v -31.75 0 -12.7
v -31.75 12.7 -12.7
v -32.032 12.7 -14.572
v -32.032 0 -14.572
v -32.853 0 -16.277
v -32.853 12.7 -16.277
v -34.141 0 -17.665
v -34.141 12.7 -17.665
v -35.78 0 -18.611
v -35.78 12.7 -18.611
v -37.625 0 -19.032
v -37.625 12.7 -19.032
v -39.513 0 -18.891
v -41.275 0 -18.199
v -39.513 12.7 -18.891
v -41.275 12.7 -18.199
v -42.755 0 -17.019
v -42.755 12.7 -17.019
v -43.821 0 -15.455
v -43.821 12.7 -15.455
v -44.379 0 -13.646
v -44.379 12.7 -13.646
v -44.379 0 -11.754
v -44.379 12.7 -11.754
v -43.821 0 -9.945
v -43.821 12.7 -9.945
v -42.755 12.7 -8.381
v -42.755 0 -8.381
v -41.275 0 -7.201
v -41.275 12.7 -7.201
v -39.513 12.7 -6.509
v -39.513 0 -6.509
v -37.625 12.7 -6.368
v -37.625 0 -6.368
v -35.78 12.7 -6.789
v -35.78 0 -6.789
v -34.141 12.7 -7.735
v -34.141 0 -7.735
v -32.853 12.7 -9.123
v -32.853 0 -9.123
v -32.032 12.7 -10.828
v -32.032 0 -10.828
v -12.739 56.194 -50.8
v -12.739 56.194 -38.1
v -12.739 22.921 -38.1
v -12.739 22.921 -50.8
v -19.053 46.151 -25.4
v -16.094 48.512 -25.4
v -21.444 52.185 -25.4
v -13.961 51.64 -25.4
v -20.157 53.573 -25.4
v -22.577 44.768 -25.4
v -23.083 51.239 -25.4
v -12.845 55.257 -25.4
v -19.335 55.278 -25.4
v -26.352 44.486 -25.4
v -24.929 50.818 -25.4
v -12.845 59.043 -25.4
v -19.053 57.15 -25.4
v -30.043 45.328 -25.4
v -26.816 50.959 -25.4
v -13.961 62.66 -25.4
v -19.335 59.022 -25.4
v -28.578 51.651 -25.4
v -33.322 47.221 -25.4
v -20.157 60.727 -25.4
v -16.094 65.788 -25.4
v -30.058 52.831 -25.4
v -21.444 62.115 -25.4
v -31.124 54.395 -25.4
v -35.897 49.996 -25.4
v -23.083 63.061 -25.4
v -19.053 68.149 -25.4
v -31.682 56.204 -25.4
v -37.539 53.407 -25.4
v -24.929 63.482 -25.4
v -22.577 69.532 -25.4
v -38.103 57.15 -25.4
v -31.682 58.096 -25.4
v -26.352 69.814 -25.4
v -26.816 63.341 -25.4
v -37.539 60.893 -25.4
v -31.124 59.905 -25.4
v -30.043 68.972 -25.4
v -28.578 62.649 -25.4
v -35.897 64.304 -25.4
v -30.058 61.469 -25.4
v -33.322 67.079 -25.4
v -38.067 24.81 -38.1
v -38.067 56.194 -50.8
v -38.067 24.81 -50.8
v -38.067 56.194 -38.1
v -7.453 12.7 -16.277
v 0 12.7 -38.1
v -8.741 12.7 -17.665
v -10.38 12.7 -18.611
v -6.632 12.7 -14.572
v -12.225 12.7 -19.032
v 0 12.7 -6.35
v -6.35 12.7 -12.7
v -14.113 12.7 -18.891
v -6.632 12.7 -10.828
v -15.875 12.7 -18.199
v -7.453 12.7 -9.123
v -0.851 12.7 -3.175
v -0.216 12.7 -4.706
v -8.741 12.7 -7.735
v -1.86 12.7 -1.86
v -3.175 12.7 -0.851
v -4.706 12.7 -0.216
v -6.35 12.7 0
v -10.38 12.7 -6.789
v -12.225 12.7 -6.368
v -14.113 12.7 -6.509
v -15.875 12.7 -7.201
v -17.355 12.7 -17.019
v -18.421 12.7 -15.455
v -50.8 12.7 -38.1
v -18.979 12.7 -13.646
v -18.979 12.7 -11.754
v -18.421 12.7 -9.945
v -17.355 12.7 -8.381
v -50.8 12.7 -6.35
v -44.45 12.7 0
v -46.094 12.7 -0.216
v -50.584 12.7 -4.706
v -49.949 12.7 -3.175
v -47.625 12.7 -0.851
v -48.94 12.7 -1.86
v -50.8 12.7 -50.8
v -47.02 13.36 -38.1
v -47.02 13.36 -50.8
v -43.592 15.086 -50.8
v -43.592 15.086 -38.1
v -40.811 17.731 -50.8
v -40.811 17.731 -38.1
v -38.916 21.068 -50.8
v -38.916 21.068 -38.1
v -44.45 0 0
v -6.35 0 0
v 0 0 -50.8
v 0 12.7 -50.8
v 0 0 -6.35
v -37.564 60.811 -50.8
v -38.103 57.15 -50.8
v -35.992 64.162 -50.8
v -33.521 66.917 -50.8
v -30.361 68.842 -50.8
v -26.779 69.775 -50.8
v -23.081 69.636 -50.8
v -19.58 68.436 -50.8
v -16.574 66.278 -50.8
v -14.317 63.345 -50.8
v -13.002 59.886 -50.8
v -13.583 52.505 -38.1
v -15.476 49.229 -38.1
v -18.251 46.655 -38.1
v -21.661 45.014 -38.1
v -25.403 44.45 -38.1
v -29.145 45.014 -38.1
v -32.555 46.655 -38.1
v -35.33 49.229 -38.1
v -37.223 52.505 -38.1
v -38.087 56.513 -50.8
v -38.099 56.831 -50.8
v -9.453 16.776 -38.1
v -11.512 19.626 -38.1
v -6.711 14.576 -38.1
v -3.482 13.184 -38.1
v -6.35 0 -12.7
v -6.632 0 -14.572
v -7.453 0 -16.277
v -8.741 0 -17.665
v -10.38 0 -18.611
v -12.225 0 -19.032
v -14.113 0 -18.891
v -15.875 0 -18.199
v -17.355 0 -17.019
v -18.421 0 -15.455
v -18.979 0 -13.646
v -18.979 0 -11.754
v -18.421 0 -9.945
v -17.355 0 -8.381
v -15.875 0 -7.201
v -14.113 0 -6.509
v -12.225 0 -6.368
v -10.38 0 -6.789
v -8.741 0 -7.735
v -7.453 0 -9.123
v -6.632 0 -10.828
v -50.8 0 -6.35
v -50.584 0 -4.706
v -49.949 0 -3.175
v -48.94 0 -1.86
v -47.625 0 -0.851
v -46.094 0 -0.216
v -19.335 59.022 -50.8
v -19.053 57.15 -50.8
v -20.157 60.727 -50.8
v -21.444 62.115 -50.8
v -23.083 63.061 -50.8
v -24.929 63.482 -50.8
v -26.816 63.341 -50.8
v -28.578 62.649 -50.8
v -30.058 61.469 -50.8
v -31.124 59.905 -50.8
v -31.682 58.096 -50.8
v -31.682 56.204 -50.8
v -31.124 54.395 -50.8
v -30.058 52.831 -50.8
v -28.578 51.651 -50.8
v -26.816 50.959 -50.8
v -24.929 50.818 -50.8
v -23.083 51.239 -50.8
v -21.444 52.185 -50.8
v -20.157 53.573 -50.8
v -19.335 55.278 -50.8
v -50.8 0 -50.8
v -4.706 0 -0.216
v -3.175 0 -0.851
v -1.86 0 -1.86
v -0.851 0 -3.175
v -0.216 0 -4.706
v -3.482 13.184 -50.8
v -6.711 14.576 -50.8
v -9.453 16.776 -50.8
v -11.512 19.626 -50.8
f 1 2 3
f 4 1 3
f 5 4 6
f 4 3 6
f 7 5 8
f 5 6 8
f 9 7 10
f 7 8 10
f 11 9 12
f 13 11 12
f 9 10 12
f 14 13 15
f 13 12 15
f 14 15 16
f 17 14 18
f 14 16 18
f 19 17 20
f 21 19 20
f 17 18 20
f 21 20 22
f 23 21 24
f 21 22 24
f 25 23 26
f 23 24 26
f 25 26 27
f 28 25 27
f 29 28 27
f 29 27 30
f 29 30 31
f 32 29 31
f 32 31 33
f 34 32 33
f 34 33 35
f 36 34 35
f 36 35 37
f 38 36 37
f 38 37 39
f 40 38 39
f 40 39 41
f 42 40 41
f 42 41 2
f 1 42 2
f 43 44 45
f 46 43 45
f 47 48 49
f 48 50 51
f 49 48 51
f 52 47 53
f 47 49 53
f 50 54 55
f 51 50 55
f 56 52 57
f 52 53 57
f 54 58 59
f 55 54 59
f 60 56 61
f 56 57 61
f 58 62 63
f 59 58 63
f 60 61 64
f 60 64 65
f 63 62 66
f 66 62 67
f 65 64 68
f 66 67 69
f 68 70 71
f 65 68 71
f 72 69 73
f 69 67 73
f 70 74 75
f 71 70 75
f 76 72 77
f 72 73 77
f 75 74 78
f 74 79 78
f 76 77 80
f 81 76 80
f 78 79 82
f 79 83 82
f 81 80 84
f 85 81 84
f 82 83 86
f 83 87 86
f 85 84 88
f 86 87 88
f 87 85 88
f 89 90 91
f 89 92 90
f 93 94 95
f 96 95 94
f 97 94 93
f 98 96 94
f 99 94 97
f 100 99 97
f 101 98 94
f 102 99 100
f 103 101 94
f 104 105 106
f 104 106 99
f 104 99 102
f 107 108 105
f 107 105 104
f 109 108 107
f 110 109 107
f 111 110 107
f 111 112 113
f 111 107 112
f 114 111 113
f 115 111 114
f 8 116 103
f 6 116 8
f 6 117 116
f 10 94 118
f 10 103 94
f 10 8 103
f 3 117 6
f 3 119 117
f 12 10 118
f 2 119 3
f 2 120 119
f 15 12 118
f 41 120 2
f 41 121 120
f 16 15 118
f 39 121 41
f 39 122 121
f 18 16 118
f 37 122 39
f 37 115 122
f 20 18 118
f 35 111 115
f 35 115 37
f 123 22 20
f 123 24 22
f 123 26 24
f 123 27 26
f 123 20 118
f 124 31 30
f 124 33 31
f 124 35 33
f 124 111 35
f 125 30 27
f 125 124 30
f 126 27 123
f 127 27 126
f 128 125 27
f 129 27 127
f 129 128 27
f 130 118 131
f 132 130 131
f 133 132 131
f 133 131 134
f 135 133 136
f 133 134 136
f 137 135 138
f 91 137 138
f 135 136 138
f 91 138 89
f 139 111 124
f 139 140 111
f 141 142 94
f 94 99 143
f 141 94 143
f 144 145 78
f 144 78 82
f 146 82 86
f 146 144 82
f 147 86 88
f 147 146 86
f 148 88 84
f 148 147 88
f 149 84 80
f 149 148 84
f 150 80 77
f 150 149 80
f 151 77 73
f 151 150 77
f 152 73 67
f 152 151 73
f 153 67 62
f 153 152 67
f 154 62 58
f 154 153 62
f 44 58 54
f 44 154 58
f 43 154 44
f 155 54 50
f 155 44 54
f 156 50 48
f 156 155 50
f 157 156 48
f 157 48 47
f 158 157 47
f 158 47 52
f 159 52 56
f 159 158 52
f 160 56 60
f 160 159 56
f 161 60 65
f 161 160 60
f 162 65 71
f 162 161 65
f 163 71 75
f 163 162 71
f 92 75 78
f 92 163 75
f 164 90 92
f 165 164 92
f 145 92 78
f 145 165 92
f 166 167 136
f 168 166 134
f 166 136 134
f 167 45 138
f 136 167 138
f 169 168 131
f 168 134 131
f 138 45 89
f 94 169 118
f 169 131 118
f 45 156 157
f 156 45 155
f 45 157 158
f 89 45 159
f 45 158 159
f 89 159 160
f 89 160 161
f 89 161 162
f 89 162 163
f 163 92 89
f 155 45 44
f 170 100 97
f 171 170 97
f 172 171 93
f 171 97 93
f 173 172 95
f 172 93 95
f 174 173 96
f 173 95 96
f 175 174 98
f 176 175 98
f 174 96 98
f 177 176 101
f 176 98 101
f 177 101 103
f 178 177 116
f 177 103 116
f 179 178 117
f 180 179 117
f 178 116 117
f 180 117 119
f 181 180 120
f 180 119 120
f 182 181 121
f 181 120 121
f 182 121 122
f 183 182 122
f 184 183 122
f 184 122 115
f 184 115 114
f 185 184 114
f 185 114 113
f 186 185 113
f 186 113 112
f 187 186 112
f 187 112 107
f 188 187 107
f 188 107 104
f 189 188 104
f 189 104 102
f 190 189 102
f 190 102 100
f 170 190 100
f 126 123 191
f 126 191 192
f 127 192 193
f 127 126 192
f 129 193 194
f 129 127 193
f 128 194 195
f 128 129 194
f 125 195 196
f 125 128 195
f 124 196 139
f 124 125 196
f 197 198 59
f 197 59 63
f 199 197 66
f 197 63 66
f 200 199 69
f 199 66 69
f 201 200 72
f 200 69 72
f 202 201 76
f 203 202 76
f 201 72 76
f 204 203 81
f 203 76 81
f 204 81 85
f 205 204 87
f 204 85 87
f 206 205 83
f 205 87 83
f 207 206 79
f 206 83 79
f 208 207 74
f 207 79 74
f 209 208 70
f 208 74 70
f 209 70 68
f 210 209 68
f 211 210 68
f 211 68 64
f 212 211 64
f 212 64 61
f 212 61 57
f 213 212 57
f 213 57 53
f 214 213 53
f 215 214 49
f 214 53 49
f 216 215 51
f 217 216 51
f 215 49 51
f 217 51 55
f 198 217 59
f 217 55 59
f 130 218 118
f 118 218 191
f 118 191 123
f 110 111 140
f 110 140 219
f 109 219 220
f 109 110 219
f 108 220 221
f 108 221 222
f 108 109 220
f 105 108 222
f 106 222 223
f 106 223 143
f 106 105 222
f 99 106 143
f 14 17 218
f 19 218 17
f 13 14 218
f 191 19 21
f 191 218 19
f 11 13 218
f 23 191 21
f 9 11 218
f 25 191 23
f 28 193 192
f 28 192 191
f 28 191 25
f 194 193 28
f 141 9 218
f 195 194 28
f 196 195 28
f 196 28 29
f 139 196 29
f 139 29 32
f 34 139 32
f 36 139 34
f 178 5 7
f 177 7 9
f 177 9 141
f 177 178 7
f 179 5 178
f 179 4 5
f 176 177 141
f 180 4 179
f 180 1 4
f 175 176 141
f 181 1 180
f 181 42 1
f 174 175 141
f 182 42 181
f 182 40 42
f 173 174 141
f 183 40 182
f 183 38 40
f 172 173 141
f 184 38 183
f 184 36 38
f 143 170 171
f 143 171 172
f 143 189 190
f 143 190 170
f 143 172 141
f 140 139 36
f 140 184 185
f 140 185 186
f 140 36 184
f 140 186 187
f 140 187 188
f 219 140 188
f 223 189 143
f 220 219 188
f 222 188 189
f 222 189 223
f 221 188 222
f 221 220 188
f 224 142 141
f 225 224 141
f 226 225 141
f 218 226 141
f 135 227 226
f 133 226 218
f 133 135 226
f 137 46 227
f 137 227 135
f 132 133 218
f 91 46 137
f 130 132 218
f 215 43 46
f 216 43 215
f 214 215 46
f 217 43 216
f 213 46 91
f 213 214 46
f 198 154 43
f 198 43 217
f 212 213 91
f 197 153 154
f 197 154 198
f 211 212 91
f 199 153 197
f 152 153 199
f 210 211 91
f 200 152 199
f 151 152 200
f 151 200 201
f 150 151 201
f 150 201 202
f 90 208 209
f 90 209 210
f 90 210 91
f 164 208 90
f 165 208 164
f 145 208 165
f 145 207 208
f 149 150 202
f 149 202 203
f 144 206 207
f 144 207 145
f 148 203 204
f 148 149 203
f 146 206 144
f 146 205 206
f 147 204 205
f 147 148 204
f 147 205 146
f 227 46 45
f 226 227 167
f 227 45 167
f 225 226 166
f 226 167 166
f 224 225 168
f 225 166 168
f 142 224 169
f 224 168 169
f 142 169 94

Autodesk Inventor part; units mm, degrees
ref_plane "YZ Plane" through (0, 0, 0) normal (1, 0, 0) x (0, 1, 0)
ref_plane "XZ Plane" through (0, 0, 0) normal (0, 1, 0) x (-1, 0, 0)
ref_plane "XY Plane" through (0, 0, 0) normal (0, 0, 1) x (1, 0, 0)
sketch "Sketch1" plane through (0, 0, 0) normal (0, 1, 0) x (-1, 0, 0)
  line L0 (0, 0) -> (50.8, 0)
  line L1 (50.8, 0) -> (50.8, -38.1)
  line L2 (50.8, -38.1) -> (0, -38.1)
  line L3 (0, -38.1) -> (0, 0)
  dimension "d0" = 50.8
  dimension "d1" = 38.1
extrude "Extrusion1" add sketch "Sketch1" along normal blind 12.7
fillet "Fillet1" radius 6.35 2 edges at (0, 6.35, 0) (-50.8, 6.35, 0)
sketch "Sketch2" plane through (0, 12.7, 0) normal (0, 1, 0) x (1, 0, 0)
  circle A0 centre (-12.7, 12.7) radius 6.35
  circle A1 centre (-38.1, 12.7) radius 6.35
  line L0 (-50.8, 38.1) -> (-50.8, 6.35) projected
  line L1 (-44.45, 0) -> (-6.35, 0) projected
  point P0 (0, 0)
  dimension "d5" = 12.7
  dimension "d6" = 12.7
  dimension "d7" = 12.7
  dimension "d8" = 12.7
extrude "Extrusion2" cut sketch "Sketch2" against normal blind 12.7
sketch "Sketch3" plane through (0, 0, -38.1) normal (0, 0, -1) x (-1, 0, 0)
  line L0 (6.35, 0) -> (0, 0) projected
  line L1 (0, 0) -> (50.8, 0)
  line L2 (50.8, 0) -> (50.8, 57.15)
  line L3 (50.8, 57.15) -> (0, 57.15)
  line L4 (0, 57.15) -> (0, 0)
  dimension "d11" = 57.15
extrude "Extrusion3" add sketch "Sketch3" along normal blind 12.7
sketch "Sketch4" plane through (0, 0, -38.1) normal (0, 0, 1) x (1, 0, 0)
  line L0 (0, 57.15) -> (0, 12.7) projected
  line L1 (0, 57.15) -> (-12.7, 57.15)
  line L2 (-12.7, 57.15) -> (-12.7, 12.7)
  line L3 (-12.7, 12.7) -> (0, 12.7)
  line L4 (0, 12.7) -> (0, 57.15)
  line L5 (-50.8, 12.7) -> (-44.45, 12.7) projected
  line L6 (-50.8, 57.15) -> (0, 57.15) projected
  line L7 (-50.8, 12.7) -> (-38.1, 12.7)
  line L8 (-38.1, 12.7) -> (-38.1, 57.15)
  line L9 (-38.1, 57.15) -> (-50.8, 57.15)
  line L10 (-50.8, 57.15) -> (-50.8, 12.7)
  point P0 (0, 0)
  dimension "d14" = 12.7
  dimension "d15" = 12.7
sketch "Sketch5" plane through (0, 0, -38.1) normal (0, 0, 1) x (1, 0, 0)
  line L0 (-50.8, 57.15) -> (0, 57.15) projected
  line L1 (-38.0673, 57.15) -> (-38.0673, 24.8104)
  line L2 (0, 12.7) -> (-50.8, 12.7) projected
  arc A0 (-50.8, 12.7) -> (-38.0673, 24.8104) centre (-51.1401, 25.8062) ccw
  line L3 (-12.7393, 57.15) -> (-12.7393, 22.9207)
  arc A1 (-12.7393, 22.9207) -> (0, 12.7) centre (0.0454, 25.8063) ccw
  line L4 (-38.0673, 57.15) -> (-50.8, 57.15)
  line L5 (-50.8, 12.7) -> (-50.8, 57.15) projected
  line L6 (-50.8, 12.7) -> (-50.8, 57.15)
  line L7 (-12.7393, 57.15) -> (0, 57.15)
  line L8 (0, 57.15) -> (0, 12.7) projected
  line L9 (0, 57.15) -> (0, 12.7)
  point P0 (0, 0)
  dimension "d16" = 13.1064
extrude "Extrusion4" cut sketch "Sketch5" against normal blind 33.3375 contours L0 L1 A0 L5 | L0 L8 A1 L3
sketch "Sketch6" plane through (0, 0, -50.8) normal (0, 0, -1) x (-1, 0, 0)
  line L0 (38.0673, 57.15) -> (12.7393, 57.15) projected
  circle A0 centre (25.4033, 57.15) radius 12.7
  point P0 (0, 0)
  dimension "d19" = 25.4
extrude "Extrusion5" add sketch "Sketch6" against normal blind 25.4
sketch "Sketch7" plane through (-25.4033, 57.15, -25.4) normal (0, 0, 1) x (1, 0, 0)
  circle A0 centre (0, 0) radius 6.35
  point P0 (25.4033, -57.15)
  dimension "d22" = 12.7
extrude "Extrusion6" cut sketch "Sketch7" against normal blind 2540
